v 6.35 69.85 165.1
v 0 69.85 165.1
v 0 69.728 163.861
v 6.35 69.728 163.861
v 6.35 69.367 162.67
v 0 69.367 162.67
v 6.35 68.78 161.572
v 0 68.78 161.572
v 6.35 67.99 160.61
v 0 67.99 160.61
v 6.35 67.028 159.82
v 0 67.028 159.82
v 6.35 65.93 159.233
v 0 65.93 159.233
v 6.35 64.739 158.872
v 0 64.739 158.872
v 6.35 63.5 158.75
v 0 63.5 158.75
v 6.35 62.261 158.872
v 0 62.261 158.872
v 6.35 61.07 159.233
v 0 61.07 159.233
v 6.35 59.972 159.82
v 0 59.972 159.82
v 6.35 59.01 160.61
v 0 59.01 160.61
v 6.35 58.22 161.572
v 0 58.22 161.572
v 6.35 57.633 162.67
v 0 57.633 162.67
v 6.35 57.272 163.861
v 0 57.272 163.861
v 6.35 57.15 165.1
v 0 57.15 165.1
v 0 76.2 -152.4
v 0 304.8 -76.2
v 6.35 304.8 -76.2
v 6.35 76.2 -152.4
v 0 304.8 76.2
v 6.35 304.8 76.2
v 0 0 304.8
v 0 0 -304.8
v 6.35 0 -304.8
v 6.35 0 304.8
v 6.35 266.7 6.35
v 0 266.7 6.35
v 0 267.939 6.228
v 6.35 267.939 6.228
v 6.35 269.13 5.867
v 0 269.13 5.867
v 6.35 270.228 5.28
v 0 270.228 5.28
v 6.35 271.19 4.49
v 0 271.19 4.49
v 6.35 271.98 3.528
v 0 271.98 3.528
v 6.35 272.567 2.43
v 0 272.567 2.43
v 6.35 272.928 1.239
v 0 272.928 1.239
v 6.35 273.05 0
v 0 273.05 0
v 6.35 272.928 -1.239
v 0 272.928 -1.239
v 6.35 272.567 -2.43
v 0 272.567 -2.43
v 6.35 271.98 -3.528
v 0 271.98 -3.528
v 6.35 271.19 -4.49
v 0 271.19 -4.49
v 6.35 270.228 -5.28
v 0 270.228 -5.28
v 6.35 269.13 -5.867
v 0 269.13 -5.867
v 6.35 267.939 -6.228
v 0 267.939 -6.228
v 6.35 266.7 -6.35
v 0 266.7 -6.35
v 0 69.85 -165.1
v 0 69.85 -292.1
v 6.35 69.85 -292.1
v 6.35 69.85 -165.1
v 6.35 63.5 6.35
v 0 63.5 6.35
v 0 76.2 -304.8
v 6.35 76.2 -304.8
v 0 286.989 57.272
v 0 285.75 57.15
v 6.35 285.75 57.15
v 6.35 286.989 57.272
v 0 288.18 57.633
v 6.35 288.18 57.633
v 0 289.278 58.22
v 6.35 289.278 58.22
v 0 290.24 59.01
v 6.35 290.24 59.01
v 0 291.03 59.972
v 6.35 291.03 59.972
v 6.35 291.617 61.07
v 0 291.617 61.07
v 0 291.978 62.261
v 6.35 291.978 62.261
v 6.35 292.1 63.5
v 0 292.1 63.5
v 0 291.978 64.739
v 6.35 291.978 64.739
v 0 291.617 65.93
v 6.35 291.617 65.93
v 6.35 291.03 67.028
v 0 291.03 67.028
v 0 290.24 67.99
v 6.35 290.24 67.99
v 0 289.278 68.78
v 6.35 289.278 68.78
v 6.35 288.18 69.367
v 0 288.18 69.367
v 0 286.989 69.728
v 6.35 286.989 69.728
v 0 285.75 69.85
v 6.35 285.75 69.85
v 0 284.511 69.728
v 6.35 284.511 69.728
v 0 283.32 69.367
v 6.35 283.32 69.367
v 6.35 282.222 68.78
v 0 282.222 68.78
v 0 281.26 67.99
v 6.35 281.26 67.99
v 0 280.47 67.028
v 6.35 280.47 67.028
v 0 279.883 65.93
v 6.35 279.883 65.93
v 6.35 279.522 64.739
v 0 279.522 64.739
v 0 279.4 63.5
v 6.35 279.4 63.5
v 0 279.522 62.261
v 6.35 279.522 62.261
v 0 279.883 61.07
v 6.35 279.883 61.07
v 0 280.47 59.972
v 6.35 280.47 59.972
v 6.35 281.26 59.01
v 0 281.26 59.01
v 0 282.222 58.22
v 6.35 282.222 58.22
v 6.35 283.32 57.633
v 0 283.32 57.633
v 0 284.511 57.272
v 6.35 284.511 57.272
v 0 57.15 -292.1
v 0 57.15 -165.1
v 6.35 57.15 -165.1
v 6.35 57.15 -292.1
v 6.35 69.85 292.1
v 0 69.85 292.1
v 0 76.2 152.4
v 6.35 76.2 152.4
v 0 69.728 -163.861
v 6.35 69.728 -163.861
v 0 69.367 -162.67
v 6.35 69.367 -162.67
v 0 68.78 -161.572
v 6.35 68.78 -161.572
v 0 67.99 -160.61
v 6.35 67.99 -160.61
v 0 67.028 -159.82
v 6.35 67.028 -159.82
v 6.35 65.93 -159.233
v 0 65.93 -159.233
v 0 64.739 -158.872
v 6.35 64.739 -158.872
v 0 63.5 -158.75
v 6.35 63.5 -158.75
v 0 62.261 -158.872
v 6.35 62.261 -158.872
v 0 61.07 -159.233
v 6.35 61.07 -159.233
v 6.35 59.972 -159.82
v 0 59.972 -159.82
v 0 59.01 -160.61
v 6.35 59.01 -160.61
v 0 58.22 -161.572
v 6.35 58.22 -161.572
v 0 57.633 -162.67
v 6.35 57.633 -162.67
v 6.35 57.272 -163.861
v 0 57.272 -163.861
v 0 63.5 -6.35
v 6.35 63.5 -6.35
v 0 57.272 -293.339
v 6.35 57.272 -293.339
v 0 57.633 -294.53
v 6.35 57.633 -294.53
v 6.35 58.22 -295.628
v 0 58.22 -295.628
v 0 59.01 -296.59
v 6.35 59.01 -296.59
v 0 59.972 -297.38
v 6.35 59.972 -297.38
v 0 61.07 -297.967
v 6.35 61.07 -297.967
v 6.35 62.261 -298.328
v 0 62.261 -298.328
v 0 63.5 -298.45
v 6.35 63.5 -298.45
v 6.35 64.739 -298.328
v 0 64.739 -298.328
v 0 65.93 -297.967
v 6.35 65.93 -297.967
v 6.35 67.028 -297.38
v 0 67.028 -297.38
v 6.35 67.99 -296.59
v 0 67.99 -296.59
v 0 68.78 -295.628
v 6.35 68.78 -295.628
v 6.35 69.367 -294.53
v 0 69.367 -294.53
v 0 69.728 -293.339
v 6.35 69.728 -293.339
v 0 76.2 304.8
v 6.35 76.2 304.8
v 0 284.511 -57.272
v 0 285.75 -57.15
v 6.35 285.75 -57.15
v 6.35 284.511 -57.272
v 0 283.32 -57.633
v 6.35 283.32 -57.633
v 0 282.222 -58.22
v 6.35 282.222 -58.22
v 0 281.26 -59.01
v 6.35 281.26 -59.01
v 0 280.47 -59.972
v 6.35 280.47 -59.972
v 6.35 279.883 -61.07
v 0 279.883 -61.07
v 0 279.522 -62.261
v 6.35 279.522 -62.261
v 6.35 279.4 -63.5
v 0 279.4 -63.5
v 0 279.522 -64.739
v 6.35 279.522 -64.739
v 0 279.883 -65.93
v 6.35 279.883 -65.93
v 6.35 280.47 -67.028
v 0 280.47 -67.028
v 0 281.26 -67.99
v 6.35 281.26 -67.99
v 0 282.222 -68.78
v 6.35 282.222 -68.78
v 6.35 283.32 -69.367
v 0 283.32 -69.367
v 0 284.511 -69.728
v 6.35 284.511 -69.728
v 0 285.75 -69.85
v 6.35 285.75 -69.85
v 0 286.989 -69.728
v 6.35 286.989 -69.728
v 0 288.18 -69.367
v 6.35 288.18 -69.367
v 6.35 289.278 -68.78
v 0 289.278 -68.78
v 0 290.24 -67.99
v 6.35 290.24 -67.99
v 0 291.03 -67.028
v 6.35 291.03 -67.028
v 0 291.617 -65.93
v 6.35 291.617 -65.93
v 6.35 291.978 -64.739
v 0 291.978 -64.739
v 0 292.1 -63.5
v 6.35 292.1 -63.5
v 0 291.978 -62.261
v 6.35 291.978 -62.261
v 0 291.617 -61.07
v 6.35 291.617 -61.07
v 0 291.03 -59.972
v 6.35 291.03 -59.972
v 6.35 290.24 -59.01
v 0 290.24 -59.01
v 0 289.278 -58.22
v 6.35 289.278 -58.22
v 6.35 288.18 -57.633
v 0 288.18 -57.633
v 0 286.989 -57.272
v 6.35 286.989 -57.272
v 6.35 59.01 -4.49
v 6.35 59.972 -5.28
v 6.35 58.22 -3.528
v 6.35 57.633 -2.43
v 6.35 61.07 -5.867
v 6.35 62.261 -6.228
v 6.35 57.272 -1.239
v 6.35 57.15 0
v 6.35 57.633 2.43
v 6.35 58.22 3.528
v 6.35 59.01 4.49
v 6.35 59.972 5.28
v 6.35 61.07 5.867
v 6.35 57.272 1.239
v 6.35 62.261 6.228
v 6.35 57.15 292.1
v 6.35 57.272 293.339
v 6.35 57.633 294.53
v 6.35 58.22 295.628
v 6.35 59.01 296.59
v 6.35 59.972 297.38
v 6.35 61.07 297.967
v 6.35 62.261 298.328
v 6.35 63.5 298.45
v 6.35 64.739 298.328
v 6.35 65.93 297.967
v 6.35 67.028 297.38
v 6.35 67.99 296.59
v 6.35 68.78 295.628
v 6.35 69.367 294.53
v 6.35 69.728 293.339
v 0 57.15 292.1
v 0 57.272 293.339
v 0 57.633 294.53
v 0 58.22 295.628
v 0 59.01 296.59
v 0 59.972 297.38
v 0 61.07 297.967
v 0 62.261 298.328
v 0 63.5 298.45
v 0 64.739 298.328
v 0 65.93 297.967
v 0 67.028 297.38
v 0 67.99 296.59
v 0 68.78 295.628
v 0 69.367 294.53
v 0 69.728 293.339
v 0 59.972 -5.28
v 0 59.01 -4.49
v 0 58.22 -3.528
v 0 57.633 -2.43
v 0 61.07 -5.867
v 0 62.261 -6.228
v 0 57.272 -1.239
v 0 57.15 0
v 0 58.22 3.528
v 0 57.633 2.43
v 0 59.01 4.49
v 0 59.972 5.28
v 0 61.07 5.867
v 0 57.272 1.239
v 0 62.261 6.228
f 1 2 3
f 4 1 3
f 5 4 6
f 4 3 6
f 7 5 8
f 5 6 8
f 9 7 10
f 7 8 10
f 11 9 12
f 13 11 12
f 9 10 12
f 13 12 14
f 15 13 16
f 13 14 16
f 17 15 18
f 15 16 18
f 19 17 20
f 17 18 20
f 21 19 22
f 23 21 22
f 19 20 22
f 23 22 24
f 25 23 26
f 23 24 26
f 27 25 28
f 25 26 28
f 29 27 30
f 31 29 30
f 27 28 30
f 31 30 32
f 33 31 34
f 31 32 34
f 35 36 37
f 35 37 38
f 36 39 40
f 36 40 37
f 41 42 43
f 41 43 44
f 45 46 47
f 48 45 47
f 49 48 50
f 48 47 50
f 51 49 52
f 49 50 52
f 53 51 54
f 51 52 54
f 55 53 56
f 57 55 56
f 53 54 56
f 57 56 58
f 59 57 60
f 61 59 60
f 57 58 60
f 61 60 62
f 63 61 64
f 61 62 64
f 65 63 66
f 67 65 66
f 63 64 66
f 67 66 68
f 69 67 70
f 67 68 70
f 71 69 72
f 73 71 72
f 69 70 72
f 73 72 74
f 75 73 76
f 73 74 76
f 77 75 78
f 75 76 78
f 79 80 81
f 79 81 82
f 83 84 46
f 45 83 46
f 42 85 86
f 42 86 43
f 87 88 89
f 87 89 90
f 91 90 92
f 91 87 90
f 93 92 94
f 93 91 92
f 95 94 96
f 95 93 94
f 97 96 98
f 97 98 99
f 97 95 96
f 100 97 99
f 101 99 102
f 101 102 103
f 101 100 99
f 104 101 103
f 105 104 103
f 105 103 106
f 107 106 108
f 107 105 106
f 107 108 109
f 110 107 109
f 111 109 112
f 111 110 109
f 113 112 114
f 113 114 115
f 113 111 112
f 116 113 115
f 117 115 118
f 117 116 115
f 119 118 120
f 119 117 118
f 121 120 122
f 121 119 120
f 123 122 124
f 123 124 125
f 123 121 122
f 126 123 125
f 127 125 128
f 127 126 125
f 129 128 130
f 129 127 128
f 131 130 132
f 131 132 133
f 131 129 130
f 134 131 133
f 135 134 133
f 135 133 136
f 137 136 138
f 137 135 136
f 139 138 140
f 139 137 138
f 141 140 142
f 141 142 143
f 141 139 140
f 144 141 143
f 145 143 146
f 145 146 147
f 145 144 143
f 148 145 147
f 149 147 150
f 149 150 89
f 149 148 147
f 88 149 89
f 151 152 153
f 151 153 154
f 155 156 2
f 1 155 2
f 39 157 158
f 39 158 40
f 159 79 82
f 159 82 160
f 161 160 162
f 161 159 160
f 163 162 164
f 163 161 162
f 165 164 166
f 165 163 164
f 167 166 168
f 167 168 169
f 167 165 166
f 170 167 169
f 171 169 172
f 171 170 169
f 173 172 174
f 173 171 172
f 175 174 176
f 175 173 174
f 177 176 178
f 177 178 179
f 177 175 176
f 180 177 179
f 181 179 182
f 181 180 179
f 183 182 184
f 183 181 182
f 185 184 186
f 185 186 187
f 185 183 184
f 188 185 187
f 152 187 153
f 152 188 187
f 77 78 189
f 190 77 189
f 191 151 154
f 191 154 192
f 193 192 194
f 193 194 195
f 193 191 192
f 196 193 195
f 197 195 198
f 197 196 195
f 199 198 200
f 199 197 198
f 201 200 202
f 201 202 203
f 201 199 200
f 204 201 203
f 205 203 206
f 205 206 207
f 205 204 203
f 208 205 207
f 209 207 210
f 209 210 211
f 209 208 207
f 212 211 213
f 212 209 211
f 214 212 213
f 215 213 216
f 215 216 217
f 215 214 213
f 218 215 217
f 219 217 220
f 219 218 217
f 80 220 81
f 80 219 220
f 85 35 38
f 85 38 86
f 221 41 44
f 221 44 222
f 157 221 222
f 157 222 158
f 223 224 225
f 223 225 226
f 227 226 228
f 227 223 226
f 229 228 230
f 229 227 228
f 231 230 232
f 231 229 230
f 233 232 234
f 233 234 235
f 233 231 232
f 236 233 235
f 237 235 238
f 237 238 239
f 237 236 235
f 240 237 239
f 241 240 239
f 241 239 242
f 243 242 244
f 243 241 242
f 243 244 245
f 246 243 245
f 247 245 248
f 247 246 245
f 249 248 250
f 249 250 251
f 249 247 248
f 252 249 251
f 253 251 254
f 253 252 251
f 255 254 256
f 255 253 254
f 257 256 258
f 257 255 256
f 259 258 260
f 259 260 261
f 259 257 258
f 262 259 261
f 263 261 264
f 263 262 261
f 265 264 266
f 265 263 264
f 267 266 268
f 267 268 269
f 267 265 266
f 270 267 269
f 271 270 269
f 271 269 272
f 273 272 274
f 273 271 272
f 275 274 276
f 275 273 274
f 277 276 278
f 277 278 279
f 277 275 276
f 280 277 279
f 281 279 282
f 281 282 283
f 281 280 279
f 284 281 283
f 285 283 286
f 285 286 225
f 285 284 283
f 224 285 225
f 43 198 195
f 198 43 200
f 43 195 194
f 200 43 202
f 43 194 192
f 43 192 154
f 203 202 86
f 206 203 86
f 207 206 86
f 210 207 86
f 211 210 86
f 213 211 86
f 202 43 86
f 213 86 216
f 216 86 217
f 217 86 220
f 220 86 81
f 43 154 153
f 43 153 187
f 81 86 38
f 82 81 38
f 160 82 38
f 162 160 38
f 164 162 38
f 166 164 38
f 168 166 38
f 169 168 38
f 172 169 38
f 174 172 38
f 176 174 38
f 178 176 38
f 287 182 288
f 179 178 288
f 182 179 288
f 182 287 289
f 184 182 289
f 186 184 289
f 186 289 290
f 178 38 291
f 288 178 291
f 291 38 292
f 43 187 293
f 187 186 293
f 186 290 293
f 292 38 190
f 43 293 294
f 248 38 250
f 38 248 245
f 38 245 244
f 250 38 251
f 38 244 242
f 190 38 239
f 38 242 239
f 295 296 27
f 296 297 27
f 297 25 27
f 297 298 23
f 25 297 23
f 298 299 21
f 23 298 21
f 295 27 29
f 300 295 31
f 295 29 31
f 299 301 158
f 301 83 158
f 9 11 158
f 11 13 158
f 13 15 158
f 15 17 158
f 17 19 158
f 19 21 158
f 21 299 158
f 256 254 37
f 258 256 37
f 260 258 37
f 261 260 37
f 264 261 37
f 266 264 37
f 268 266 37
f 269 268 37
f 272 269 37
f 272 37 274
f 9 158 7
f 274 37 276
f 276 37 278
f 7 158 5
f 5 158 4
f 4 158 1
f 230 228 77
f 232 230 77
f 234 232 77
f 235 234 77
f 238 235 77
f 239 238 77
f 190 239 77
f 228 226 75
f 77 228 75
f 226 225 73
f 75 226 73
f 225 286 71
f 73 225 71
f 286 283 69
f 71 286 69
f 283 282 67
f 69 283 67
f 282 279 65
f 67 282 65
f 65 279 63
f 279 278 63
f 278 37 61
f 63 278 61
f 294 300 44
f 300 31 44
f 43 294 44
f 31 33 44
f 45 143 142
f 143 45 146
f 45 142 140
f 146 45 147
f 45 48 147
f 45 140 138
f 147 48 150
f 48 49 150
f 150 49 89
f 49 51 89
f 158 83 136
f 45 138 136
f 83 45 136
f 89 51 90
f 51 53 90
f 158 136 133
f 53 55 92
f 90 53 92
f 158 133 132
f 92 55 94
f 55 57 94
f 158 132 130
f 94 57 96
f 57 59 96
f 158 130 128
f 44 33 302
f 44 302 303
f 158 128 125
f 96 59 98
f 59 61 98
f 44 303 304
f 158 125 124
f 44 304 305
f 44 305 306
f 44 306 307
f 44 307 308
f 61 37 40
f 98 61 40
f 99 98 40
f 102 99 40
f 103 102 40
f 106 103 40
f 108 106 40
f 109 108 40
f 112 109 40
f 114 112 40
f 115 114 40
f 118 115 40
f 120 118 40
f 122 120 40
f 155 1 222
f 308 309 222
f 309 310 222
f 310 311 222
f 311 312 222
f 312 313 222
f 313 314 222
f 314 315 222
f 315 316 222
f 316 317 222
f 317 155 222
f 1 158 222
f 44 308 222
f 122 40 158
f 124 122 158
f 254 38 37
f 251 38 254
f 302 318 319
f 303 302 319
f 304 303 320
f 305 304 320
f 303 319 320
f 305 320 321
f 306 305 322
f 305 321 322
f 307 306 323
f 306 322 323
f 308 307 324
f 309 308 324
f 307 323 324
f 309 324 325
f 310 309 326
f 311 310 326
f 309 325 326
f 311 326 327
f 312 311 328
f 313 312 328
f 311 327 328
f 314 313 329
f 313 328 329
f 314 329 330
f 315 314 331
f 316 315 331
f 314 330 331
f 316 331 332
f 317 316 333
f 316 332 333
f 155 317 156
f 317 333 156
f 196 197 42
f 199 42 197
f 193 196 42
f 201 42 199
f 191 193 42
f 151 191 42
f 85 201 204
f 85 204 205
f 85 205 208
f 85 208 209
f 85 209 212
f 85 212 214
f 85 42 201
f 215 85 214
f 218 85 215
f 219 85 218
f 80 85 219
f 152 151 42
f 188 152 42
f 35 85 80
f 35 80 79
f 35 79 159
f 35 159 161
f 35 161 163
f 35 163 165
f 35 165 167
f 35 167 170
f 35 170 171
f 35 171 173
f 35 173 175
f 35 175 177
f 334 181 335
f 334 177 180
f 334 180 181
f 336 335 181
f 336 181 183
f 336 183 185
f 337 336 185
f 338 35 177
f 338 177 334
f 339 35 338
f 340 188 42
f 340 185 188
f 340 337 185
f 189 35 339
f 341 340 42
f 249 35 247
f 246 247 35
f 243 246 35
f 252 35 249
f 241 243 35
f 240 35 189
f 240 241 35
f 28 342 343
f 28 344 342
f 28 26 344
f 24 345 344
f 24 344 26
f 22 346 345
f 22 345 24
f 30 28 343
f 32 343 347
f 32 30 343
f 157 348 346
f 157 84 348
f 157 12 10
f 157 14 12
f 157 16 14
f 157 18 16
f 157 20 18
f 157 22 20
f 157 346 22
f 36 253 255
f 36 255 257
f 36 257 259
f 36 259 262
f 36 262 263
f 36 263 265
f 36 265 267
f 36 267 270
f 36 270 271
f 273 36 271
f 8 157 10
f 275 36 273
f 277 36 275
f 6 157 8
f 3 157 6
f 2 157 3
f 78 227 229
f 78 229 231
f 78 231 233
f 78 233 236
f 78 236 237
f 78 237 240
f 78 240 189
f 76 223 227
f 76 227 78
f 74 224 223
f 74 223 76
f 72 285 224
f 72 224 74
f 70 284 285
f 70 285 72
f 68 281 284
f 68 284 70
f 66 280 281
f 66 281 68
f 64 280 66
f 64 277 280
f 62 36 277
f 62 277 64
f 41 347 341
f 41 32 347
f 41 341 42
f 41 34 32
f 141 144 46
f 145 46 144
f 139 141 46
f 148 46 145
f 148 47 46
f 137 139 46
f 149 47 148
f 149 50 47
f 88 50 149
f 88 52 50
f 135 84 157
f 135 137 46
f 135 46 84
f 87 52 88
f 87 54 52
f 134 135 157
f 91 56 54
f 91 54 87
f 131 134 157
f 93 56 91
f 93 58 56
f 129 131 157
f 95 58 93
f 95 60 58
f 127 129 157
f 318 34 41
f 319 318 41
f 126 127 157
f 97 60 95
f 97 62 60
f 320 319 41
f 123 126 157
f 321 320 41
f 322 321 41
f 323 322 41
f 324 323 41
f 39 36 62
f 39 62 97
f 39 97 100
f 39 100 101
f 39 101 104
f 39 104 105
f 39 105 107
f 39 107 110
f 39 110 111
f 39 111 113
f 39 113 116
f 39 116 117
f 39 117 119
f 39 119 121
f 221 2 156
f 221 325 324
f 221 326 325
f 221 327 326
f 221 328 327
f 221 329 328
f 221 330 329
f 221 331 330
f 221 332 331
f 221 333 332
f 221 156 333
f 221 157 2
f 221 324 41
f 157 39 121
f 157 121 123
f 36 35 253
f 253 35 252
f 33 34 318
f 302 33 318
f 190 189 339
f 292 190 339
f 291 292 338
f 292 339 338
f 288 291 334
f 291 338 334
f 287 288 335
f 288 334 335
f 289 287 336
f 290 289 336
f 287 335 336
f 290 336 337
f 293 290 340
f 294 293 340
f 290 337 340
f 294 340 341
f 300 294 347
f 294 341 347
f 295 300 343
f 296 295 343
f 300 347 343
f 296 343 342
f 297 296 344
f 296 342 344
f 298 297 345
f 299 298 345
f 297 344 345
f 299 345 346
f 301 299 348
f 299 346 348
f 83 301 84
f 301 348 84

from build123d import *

# Parameters (mm, degrees)
SKETCH1_R           = 6.35
BOSS_EXTRUDE1_DEPTH = 6.35


with BuildPart() as part:
    # Sketch1 → Boss-Extrude1 (new body)
    with BuildSketch(Plane(origin=(0, 0, 0), x_dir=(0, 0, -1), z_dir=(1, 0, 0))):
        Polygon((304.8, 0), (-304.8, 0), (-304.8, 76.2), (-152.4, 76.2), (-76.2, 304.8), (76.2, 304.8), (152.4, 76.2), (304.8, 76.2), align=None)
        with Locations((-63.5, 285.75)):
            Circle(SKETCH1_R, mode=Mode.SUBTRACT)
        with Locations(Location((63.5, 285.75, 0), (0, 0, 180))):
            Circle(SKETCH1_R, mode=Mode.SUBTRACT)
        with BuildLine():
            Line((-292.1, 69.85), (-165.1, 69.85))
            ThreePointArc((-165.1, 69.85), (-158.75, 63.5), (-165.1, 57.15))
            Line((-165.1, 57.15), (-292.1, 57.15))
            ThreePointArc((-292.1, 57.15), (-298.45, 63.5), (-292.1, 69.85))
        make_face(mode=Mode.SUBTRACT)
        with BuildLine():
            Line((292.1, 69.85), (165.1, 69.85))
            ThreePointArc((165.1, 69.85), (158.75, 63.5), (165.1, 57.15))
            Line((165.1, 57.15), (292.1, 57.15))
            ThreePointArc((292.1, 57.15), (298.45, 63.5), (292.1, 69.85))
        make_face(mode=Mode.SUBTRACT)
        with BuildLine():
            Line((6.35, 266.7), (6.35, 63.5))
            ThreePointArc((6.35, 63.5), (0, 57.15), (-6.35, 63.5))
            Line((-6.35, 63.5), (-6.35, 266.7))
            ThreePointArc((-6.35, 266.7), (0, 273.05), (6.35, 266.7))
        make_face(mode=Mode.SUBTRACT)
    extrude(amount=BOSS_EXTRUDE1_DEPTH)


solid = part.part
